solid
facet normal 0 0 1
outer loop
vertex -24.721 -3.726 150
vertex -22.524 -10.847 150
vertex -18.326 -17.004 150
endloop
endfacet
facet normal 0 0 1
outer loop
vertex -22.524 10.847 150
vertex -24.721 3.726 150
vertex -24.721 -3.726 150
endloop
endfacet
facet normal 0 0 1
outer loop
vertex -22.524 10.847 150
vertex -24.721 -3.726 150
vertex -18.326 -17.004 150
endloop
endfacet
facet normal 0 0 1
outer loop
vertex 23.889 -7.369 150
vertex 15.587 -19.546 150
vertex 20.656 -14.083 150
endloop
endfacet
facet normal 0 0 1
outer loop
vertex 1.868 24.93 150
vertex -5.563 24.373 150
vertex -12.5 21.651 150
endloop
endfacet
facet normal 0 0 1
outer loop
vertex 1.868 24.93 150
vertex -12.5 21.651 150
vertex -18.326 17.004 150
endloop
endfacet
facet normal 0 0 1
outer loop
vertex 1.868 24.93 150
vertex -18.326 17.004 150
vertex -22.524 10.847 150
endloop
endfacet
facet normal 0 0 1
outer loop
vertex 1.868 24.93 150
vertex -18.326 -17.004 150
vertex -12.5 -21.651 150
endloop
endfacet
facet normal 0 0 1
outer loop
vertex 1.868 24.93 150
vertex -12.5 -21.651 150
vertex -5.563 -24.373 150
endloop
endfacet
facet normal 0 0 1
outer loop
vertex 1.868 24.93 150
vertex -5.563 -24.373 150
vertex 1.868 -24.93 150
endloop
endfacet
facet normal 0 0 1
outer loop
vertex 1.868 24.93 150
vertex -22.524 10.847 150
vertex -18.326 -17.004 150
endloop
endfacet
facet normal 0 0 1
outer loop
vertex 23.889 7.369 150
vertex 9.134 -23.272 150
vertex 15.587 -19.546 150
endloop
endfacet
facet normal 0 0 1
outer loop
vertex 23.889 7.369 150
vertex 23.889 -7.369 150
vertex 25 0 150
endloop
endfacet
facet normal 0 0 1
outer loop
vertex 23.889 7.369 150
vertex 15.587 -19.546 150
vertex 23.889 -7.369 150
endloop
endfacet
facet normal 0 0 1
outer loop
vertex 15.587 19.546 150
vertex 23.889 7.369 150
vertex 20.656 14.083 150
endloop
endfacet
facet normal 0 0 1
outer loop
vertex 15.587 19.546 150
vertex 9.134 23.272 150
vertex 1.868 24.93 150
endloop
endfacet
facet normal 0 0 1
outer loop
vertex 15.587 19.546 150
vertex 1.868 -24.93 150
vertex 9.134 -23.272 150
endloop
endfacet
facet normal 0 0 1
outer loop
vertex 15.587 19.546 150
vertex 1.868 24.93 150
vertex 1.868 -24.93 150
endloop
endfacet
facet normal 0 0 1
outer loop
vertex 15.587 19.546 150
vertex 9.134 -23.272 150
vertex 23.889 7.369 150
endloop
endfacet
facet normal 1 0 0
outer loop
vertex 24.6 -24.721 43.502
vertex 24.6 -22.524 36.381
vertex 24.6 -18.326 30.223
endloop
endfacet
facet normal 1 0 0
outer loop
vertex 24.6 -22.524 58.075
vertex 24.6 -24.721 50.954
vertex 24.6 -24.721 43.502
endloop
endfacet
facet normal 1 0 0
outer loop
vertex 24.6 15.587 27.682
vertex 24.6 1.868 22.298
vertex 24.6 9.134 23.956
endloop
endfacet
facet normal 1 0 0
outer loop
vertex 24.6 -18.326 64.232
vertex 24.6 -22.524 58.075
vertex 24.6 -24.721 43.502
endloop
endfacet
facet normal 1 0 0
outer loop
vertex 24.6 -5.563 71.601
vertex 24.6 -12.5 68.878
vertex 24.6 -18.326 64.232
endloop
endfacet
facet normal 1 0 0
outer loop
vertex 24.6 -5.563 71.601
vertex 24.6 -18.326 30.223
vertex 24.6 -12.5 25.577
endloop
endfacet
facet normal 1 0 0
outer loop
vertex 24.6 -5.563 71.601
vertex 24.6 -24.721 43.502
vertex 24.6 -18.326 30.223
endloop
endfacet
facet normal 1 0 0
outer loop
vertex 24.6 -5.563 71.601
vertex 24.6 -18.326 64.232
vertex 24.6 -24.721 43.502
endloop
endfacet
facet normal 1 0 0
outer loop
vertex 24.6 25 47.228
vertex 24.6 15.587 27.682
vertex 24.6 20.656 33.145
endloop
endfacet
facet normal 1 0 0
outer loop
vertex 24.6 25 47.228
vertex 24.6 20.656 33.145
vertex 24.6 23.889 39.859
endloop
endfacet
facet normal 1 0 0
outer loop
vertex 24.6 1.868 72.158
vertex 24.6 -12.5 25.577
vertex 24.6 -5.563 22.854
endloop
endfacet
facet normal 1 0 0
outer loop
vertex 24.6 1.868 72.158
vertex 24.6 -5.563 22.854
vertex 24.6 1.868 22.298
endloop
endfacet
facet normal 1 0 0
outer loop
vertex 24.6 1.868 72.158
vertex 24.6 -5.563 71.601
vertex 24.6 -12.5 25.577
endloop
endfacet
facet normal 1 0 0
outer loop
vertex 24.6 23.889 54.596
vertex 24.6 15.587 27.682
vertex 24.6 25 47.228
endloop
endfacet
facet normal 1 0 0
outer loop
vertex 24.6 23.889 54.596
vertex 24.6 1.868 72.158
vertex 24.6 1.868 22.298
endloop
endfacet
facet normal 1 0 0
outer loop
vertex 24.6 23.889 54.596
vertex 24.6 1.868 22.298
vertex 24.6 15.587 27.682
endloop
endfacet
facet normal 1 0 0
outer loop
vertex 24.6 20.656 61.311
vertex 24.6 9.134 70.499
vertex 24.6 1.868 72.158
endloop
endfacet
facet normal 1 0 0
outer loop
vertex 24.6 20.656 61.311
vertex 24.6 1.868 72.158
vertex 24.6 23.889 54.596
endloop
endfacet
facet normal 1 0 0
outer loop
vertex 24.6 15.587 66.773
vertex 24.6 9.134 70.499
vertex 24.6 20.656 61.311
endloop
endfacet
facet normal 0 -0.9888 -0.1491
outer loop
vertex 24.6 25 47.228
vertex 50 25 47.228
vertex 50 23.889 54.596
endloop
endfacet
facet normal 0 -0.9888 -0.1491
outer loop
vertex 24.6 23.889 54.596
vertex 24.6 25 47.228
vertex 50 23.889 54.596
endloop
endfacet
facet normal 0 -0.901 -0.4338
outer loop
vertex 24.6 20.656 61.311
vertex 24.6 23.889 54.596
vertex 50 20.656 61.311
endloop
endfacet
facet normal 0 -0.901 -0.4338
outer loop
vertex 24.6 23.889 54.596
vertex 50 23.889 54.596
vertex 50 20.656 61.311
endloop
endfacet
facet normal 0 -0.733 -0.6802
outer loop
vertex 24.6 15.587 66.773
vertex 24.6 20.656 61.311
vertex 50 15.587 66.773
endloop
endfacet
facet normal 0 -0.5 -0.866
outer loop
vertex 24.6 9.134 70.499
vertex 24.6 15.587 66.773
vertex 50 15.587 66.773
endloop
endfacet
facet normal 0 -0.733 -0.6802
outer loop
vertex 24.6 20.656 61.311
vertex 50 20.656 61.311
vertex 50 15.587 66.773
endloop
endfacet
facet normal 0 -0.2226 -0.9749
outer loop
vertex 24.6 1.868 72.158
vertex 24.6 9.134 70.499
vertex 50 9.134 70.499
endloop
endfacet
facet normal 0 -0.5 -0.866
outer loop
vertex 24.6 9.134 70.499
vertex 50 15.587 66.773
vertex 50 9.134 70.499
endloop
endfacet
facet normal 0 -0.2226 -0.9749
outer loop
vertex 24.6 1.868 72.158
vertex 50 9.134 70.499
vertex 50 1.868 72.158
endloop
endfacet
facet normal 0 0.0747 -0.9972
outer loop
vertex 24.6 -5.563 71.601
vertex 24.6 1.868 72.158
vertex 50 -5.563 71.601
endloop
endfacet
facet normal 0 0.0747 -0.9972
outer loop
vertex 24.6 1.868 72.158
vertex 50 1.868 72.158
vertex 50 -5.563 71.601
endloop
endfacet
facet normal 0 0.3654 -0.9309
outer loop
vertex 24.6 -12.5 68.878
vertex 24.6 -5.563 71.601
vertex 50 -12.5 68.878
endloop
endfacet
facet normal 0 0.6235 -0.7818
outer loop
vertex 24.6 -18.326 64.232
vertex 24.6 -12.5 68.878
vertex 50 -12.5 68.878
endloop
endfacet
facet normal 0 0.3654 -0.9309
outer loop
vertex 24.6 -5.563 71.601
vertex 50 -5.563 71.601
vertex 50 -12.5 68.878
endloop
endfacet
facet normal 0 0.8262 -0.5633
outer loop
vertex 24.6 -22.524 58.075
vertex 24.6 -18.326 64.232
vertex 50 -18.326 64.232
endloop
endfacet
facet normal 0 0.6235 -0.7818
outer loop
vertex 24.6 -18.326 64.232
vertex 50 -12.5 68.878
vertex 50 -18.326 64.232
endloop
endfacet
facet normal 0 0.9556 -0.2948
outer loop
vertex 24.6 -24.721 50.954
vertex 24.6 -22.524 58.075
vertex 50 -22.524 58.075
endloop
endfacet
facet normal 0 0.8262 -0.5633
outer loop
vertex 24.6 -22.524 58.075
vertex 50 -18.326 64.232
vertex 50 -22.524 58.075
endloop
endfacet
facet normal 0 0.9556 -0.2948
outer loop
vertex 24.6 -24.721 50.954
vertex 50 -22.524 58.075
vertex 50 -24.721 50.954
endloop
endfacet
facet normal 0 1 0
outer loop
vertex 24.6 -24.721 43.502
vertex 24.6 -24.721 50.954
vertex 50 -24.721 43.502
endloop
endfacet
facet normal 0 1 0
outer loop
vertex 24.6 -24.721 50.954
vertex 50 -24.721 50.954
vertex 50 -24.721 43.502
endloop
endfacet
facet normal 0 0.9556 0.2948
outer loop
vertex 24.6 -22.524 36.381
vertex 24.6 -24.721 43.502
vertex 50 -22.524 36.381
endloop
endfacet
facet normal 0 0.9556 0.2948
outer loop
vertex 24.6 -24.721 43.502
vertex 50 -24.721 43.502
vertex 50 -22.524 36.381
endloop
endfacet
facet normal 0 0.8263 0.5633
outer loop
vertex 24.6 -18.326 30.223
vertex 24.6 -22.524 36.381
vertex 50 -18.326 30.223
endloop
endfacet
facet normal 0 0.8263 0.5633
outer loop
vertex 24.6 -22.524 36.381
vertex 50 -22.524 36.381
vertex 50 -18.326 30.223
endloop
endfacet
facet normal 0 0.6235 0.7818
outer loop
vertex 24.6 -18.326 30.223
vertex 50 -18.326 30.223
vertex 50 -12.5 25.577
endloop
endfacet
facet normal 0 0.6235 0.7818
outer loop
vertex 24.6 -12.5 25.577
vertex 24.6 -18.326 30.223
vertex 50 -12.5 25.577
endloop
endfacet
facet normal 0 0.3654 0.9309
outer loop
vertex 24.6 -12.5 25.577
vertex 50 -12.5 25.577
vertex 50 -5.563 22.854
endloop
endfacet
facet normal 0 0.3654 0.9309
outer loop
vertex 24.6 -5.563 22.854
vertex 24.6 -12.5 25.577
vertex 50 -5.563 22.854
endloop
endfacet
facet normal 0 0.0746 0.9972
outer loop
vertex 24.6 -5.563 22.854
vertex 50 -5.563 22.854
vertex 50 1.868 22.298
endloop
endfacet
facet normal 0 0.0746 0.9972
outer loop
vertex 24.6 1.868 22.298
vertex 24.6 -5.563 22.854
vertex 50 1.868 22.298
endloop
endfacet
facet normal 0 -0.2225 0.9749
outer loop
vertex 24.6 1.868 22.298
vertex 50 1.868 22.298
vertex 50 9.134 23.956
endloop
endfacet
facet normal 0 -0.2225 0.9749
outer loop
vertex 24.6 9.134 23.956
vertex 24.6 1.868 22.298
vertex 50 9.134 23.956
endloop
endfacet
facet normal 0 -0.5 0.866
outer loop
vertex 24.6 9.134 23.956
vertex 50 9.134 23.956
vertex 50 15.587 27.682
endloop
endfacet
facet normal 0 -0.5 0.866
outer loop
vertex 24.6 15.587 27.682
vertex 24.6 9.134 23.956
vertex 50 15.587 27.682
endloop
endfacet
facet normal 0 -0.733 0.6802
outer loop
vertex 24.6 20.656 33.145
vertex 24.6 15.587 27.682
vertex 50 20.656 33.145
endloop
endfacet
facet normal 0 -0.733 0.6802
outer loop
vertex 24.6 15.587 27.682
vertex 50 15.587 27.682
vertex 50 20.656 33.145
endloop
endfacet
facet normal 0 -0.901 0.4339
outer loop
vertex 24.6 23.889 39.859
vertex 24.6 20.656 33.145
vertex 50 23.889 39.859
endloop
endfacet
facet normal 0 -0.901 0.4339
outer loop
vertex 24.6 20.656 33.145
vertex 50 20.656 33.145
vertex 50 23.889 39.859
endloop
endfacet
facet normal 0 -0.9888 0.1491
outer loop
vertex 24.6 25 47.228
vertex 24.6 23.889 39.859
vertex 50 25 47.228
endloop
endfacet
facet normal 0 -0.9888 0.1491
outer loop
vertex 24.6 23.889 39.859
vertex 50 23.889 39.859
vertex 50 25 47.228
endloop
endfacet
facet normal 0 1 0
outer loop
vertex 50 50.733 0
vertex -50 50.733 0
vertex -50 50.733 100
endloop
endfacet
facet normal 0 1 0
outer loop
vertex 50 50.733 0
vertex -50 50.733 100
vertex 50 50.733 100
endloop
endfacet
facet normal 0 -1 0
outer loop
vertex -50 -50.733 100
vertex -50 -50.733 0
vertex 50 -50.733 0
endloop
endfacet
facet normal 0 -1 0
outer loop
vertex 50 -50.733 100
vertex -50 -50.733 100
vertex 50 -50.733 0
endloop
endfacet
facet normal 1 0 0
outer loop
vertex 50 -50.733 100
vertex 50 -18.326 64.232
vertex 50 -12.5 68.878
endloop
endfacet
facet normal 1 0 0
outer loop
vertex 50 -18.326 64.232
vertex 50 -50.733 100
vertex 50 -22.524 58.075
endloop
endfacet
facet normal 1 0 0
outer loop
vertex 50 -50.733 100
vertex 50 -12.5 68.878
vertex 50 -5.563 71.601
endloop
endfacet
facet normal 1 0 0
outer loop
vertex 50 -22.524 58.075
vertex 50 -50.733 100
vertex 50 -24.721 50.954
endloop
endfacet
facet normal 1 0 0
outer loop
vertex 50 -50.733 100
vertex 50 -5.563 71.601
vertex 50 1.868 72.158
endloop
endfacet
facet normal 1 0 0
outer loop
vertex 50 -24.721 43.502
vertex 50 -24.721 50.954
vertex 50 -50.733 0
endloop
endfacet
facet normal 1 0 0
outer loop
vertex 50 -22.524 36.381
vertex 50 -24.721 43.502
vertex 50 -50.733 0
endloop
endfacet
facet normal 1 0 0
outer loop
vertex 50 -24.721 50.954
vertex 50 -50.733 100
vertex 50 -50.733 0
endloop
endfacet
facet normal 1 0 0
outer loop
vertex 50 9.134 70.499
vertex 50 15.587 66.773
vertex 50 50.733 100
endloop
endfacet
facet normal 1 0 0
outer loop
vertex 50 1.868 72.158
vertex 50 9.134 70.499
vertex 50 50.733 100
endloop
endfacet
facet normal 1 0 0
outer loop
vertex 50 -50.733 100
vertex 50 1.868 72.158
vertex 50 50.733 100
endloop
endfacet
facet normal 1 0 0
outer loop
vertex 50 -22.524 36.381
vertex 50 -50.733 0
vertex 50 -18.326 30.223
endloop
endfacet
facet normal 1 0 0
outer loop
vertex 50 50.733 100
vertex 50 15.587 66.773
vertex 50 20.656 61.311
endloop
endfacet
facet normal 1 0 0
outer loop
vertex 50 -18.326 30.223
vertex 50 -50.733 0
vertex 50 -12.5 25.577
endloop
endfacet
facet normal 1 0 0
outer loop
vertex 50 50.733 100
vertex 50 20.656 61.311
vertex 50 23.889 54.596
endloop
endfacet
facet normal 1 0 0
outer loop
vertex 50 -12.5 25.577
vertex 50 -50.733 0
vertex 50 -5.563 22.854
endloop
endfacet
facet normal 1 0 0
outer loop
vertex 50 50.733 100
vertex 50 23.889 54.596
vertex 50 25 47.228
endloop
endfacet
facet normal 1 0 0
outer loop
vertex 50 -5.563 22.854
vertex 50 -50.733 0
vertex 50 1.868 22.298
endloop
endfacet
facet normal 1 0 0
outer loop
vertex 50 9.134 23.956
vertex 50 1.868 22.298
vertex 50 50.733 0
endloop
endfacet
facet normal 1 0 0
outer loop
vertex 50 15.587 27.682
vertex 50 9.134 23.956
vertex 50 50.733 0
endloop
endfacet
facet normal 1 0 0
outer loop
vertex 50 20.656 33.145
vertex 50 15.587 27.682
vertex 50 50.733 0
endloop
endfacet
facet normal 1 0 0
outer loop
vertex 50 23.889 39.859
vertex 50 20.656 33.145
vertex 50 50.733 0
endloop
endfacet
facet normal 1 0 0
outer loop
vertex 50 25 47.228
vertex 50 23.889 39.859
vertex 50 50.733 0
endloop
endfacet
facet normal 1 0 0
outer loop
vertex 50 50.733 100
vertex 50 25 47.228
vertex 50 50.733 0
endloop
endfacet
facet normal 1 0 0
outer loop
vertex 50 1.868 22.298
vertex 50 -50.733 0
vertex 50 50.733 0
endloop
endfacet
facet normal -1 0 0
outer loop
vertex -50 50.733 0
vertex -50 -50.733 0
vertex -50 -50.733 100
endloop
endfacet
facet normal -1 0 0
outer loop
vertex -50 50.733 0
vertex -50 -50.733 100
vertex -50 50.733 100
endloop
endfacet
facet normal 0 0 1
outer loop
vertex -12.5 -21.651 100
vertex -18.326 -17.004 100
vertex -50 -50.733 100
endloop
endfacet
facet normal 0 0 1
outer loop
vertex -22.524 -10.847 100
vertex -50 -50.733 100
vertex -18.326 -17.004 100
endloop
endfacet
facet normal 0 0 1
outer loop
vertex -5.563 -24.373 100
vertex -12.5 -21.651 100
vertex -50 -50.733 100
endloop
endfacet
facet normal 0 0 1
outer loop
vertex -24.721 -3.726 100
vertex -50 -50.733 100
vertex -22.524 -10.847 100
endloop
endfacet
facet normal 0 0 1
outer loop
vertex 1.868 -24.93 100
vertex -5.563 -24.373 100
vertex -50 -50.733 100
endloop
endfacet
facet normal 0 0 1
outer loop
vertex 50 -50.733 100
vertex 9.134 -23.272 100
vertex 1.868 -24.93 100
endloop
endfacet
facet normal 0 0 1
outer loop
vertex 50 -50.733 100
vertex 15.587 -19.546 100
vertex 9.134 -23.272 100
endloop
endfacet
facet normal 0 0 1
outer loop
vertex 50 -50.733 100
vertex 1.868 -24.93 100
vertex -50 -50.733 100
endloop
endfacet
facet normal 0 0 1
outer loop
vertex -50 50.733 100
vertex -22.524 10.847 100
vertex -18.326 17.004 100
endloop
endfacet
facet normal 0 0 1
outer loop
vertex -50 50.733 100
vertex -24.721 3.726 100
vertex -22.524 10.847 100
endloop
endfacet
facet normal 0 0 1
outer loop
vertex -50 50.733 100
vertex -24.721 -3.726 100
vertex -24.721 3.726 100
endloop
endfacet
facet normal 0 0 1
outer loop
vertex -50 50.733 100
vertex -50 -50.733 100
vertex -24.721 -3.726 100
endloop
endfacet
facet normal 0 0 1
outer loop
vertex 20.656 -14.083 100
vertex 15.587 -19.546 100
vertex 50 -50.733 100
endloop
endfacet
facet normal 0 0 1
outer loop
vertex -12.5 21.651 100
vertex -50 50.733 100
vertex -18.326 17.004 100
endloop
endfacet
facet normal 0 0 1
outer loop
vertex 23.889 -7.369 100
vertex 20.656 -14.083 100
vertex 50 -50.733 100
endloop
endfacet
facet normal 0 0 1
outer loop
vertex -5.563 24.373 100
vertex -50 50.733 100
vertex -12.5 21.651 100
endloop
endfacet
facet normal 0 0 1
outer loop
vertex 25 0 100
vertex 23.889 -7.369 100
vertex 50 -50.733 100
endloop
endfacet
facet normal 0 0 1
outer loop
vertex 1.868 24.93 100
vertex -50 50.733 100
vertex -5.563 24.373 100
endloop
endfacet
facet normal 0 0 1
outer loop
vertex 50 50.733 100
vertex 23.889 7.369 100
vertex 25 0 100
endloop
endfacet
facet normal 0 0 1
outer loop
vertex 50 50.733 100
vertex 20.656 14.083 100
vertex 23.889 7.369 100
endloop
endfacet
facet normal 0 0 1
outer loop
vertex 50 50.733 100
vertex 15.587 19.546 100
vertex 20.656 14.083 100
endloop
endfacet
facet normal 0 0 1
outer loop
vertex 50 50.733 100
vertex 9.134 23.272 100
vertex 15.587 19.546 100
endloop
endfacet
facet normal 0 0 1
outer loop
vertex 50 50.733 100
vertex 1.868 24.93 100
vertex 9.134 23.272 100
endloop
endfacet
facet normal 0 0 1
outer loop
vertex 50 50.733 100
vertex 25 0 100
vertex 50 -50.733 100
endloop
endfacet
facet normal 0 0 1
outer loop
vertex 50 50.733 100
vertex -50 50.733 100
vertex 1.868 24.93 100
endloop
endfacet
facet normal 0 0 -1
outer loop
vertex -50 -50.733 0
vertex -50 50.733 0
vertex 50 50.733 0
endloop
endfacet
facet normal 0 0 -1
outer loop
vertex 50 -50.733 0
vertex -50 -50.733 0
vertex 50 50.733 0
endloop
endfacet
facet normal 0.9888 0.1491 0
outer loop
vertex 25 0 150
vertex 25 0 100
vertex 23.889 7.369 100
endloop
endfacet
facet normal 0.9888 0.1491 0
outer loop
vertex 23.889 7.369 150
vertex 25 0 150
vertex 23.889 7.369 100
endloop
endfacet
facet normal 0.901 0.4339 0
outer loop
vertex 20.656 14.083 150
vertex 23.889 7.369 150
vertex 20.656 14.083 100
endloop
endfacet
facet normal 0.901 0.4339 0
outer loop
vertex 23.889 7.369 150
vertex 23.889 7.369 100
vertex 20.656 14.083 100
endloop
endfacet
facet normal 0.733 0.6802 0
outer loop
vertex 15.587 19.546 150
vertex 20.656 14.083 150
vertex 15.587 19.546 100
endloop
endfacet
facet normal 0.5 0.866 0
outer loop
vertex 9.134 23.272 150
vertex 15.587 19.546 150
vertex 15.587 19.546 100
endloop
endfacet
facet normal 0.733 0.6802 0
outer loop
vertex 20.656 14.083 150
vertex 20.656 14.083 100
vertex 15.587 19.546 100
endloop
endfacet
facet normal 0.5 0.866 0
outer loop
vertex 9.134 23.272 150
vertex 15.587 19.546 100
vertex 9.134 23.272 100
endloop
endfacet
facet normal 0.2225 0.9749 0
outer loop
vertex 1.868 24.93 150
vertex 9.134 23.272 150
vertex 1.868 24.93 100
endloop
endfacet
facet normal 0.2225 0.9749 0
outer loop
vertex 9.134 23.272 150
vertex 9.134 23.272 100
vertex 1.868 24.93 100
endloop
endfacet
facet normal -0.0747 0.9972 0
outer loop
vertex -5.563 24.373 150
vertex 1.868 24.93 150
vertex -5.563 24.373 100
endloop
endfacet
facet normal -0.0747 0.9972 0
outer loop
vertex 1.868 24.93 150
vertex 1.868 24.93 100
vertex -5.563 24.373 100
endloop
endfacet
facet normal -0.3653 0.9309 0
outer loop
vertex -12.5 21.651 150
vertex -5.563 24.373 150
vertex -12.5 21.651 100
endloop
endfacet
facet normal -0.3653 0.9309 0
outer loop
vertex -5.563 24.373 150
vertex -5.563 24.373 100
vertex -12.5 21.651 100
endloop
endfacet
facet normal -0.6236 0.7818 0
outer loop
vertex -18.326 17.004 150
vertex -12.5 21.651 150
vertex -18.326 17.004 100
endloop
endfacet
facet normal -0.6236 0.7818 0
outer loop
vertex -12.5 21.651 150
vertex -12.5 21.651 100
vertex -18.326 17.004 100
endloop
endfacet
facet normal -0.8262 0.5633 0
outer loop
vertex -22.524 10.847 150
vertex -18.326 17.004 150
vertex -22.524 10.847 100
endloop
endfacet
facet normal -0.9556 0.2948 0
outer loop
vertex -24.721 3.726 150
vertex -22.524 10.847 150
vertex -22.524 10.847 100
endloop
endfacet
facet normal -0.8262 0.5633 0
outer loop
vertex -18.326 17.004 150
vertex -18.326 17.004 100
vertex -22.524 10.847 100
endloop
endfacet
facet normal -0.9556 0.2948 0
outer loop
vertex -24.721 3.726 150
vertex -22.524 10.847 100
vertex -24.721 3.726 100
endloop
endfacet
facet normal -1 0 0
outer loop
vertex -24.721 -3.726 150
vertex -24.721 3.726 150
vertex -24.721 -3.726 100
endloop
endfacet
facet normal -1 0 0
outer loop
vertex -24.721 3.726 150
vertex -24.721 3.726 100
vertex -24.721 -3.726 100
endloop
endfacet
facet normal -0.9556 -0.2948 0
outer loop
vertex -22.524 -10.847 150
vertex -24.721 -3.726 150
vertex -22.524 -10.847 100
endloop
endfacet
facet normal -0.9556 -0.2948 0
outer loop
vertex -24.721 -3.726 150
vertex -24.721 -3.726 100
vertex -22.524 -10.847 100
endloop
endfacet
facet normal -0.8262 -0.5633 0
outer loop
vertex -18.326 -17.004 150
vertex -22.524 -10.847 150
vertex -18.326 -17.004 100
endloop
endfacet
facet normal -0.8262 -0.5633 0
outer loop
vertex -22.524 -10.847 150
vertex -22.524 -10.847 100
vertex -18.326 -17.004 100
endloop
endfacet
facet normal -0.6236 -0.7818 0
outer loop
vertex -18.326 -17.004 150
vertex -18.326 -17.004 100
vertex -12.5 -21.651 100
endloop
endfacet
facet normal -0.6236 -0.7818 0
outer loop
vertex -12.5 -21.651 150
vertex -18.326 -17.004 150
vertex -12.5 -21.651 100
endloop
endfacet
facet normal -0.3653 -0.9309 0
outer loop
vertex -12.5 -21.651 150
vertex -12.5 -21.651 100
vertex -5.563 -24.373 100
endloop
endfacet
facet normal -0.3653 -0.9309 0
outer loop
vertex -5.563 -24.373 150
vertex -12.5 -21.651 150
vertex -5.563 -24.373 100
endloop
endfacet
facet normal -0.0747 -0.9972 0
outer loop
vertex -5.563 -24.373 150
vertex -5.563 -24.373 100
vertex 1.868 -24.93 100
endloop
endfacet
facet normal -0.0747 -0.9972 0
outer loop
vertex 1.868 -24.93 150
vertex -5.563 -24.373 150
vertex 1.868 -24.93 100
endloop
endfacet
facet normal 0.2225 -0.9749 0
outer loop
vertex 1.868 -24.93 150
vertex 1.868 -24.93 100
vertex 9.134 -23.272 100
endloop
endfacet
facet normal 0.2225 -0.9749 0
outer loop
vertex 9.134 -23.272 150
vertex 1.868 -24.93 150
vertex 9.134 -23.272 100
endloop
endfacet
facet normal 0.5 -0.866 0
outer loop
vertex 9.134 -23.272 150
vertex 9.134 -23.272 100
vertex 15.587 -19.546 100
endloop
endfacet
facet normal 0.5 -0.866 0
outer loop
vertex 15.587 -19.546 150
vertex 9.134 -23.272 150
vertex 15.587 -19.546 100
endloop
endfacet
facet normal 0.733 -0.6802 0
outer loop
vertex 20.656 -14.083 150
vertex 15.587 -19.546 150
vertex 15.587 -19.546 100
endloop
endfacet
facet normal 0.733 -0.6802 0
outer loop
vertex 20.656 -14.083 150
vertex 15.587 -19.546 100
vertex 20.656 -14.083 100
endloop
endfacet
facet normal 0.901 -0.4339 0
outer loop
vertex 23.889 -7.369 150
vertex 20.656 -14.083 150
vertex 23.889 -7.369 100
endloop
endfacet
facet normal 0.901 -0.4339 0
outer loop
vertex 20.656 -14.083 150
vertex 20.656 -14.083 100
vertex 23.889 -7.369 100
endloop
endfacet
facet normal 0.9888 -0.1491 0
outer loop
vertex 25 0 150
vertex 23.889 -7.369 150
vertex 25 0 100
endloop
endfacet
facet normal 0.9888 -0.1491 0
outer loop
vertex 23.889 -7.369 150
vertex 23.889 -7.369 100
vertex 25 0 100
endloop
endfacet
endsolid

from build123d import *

# Parameters (mm, degrees)
F0_W     = 100
F0_H     = 101.4652305061
F1_DEPTH = 100
F2_R     = 25
F3_DEPTH = 50
F4_R     = 25
F5_DEPTH = 50
F7_DEPTH = 25.4
F8_R     = 25
F9_DEPTH = 25.4


# Not quite as in the source:
# - the program builds the solid bodies; features that only make, move or delete a surface that nothing else refers to are left out


with BuildPart() as f1:
    # F0 (on Top) → F1 (new body)
    with BuildSketch(Plane.XY):
        Rectangle(F0_W, F0_H)
    extrude(amount=F1_DEPTH)

    # F2 (on face) → F3 (join)
    with BuildSketch(Plane.XY.offset(100)):
        Circle(F2_R)
    extrude(amount=F3_DEPTH)

    # F4 (on Top) → F5 (join)
    with BuildSketch(Plane.XY):
        Circle(F4_R)
    extrude(amount=F5_DEPTH)

    # F4 (on Top) → F7 (join)
    with BuildSketch(Plane.XY):
        Circle(F4_R)
    extrude(amount=F7_DEPTH)

    # F8 (on face) → F9 (cut)
    with BuildSketch(Plane.YZ.offset(50)):
        with Locations((0, 47.2276035258)):
            Circle(F8_R)
    extrude(amount=-F9_DEPTH, mode=Mode.SUBTRACT)


solid = f1.part
